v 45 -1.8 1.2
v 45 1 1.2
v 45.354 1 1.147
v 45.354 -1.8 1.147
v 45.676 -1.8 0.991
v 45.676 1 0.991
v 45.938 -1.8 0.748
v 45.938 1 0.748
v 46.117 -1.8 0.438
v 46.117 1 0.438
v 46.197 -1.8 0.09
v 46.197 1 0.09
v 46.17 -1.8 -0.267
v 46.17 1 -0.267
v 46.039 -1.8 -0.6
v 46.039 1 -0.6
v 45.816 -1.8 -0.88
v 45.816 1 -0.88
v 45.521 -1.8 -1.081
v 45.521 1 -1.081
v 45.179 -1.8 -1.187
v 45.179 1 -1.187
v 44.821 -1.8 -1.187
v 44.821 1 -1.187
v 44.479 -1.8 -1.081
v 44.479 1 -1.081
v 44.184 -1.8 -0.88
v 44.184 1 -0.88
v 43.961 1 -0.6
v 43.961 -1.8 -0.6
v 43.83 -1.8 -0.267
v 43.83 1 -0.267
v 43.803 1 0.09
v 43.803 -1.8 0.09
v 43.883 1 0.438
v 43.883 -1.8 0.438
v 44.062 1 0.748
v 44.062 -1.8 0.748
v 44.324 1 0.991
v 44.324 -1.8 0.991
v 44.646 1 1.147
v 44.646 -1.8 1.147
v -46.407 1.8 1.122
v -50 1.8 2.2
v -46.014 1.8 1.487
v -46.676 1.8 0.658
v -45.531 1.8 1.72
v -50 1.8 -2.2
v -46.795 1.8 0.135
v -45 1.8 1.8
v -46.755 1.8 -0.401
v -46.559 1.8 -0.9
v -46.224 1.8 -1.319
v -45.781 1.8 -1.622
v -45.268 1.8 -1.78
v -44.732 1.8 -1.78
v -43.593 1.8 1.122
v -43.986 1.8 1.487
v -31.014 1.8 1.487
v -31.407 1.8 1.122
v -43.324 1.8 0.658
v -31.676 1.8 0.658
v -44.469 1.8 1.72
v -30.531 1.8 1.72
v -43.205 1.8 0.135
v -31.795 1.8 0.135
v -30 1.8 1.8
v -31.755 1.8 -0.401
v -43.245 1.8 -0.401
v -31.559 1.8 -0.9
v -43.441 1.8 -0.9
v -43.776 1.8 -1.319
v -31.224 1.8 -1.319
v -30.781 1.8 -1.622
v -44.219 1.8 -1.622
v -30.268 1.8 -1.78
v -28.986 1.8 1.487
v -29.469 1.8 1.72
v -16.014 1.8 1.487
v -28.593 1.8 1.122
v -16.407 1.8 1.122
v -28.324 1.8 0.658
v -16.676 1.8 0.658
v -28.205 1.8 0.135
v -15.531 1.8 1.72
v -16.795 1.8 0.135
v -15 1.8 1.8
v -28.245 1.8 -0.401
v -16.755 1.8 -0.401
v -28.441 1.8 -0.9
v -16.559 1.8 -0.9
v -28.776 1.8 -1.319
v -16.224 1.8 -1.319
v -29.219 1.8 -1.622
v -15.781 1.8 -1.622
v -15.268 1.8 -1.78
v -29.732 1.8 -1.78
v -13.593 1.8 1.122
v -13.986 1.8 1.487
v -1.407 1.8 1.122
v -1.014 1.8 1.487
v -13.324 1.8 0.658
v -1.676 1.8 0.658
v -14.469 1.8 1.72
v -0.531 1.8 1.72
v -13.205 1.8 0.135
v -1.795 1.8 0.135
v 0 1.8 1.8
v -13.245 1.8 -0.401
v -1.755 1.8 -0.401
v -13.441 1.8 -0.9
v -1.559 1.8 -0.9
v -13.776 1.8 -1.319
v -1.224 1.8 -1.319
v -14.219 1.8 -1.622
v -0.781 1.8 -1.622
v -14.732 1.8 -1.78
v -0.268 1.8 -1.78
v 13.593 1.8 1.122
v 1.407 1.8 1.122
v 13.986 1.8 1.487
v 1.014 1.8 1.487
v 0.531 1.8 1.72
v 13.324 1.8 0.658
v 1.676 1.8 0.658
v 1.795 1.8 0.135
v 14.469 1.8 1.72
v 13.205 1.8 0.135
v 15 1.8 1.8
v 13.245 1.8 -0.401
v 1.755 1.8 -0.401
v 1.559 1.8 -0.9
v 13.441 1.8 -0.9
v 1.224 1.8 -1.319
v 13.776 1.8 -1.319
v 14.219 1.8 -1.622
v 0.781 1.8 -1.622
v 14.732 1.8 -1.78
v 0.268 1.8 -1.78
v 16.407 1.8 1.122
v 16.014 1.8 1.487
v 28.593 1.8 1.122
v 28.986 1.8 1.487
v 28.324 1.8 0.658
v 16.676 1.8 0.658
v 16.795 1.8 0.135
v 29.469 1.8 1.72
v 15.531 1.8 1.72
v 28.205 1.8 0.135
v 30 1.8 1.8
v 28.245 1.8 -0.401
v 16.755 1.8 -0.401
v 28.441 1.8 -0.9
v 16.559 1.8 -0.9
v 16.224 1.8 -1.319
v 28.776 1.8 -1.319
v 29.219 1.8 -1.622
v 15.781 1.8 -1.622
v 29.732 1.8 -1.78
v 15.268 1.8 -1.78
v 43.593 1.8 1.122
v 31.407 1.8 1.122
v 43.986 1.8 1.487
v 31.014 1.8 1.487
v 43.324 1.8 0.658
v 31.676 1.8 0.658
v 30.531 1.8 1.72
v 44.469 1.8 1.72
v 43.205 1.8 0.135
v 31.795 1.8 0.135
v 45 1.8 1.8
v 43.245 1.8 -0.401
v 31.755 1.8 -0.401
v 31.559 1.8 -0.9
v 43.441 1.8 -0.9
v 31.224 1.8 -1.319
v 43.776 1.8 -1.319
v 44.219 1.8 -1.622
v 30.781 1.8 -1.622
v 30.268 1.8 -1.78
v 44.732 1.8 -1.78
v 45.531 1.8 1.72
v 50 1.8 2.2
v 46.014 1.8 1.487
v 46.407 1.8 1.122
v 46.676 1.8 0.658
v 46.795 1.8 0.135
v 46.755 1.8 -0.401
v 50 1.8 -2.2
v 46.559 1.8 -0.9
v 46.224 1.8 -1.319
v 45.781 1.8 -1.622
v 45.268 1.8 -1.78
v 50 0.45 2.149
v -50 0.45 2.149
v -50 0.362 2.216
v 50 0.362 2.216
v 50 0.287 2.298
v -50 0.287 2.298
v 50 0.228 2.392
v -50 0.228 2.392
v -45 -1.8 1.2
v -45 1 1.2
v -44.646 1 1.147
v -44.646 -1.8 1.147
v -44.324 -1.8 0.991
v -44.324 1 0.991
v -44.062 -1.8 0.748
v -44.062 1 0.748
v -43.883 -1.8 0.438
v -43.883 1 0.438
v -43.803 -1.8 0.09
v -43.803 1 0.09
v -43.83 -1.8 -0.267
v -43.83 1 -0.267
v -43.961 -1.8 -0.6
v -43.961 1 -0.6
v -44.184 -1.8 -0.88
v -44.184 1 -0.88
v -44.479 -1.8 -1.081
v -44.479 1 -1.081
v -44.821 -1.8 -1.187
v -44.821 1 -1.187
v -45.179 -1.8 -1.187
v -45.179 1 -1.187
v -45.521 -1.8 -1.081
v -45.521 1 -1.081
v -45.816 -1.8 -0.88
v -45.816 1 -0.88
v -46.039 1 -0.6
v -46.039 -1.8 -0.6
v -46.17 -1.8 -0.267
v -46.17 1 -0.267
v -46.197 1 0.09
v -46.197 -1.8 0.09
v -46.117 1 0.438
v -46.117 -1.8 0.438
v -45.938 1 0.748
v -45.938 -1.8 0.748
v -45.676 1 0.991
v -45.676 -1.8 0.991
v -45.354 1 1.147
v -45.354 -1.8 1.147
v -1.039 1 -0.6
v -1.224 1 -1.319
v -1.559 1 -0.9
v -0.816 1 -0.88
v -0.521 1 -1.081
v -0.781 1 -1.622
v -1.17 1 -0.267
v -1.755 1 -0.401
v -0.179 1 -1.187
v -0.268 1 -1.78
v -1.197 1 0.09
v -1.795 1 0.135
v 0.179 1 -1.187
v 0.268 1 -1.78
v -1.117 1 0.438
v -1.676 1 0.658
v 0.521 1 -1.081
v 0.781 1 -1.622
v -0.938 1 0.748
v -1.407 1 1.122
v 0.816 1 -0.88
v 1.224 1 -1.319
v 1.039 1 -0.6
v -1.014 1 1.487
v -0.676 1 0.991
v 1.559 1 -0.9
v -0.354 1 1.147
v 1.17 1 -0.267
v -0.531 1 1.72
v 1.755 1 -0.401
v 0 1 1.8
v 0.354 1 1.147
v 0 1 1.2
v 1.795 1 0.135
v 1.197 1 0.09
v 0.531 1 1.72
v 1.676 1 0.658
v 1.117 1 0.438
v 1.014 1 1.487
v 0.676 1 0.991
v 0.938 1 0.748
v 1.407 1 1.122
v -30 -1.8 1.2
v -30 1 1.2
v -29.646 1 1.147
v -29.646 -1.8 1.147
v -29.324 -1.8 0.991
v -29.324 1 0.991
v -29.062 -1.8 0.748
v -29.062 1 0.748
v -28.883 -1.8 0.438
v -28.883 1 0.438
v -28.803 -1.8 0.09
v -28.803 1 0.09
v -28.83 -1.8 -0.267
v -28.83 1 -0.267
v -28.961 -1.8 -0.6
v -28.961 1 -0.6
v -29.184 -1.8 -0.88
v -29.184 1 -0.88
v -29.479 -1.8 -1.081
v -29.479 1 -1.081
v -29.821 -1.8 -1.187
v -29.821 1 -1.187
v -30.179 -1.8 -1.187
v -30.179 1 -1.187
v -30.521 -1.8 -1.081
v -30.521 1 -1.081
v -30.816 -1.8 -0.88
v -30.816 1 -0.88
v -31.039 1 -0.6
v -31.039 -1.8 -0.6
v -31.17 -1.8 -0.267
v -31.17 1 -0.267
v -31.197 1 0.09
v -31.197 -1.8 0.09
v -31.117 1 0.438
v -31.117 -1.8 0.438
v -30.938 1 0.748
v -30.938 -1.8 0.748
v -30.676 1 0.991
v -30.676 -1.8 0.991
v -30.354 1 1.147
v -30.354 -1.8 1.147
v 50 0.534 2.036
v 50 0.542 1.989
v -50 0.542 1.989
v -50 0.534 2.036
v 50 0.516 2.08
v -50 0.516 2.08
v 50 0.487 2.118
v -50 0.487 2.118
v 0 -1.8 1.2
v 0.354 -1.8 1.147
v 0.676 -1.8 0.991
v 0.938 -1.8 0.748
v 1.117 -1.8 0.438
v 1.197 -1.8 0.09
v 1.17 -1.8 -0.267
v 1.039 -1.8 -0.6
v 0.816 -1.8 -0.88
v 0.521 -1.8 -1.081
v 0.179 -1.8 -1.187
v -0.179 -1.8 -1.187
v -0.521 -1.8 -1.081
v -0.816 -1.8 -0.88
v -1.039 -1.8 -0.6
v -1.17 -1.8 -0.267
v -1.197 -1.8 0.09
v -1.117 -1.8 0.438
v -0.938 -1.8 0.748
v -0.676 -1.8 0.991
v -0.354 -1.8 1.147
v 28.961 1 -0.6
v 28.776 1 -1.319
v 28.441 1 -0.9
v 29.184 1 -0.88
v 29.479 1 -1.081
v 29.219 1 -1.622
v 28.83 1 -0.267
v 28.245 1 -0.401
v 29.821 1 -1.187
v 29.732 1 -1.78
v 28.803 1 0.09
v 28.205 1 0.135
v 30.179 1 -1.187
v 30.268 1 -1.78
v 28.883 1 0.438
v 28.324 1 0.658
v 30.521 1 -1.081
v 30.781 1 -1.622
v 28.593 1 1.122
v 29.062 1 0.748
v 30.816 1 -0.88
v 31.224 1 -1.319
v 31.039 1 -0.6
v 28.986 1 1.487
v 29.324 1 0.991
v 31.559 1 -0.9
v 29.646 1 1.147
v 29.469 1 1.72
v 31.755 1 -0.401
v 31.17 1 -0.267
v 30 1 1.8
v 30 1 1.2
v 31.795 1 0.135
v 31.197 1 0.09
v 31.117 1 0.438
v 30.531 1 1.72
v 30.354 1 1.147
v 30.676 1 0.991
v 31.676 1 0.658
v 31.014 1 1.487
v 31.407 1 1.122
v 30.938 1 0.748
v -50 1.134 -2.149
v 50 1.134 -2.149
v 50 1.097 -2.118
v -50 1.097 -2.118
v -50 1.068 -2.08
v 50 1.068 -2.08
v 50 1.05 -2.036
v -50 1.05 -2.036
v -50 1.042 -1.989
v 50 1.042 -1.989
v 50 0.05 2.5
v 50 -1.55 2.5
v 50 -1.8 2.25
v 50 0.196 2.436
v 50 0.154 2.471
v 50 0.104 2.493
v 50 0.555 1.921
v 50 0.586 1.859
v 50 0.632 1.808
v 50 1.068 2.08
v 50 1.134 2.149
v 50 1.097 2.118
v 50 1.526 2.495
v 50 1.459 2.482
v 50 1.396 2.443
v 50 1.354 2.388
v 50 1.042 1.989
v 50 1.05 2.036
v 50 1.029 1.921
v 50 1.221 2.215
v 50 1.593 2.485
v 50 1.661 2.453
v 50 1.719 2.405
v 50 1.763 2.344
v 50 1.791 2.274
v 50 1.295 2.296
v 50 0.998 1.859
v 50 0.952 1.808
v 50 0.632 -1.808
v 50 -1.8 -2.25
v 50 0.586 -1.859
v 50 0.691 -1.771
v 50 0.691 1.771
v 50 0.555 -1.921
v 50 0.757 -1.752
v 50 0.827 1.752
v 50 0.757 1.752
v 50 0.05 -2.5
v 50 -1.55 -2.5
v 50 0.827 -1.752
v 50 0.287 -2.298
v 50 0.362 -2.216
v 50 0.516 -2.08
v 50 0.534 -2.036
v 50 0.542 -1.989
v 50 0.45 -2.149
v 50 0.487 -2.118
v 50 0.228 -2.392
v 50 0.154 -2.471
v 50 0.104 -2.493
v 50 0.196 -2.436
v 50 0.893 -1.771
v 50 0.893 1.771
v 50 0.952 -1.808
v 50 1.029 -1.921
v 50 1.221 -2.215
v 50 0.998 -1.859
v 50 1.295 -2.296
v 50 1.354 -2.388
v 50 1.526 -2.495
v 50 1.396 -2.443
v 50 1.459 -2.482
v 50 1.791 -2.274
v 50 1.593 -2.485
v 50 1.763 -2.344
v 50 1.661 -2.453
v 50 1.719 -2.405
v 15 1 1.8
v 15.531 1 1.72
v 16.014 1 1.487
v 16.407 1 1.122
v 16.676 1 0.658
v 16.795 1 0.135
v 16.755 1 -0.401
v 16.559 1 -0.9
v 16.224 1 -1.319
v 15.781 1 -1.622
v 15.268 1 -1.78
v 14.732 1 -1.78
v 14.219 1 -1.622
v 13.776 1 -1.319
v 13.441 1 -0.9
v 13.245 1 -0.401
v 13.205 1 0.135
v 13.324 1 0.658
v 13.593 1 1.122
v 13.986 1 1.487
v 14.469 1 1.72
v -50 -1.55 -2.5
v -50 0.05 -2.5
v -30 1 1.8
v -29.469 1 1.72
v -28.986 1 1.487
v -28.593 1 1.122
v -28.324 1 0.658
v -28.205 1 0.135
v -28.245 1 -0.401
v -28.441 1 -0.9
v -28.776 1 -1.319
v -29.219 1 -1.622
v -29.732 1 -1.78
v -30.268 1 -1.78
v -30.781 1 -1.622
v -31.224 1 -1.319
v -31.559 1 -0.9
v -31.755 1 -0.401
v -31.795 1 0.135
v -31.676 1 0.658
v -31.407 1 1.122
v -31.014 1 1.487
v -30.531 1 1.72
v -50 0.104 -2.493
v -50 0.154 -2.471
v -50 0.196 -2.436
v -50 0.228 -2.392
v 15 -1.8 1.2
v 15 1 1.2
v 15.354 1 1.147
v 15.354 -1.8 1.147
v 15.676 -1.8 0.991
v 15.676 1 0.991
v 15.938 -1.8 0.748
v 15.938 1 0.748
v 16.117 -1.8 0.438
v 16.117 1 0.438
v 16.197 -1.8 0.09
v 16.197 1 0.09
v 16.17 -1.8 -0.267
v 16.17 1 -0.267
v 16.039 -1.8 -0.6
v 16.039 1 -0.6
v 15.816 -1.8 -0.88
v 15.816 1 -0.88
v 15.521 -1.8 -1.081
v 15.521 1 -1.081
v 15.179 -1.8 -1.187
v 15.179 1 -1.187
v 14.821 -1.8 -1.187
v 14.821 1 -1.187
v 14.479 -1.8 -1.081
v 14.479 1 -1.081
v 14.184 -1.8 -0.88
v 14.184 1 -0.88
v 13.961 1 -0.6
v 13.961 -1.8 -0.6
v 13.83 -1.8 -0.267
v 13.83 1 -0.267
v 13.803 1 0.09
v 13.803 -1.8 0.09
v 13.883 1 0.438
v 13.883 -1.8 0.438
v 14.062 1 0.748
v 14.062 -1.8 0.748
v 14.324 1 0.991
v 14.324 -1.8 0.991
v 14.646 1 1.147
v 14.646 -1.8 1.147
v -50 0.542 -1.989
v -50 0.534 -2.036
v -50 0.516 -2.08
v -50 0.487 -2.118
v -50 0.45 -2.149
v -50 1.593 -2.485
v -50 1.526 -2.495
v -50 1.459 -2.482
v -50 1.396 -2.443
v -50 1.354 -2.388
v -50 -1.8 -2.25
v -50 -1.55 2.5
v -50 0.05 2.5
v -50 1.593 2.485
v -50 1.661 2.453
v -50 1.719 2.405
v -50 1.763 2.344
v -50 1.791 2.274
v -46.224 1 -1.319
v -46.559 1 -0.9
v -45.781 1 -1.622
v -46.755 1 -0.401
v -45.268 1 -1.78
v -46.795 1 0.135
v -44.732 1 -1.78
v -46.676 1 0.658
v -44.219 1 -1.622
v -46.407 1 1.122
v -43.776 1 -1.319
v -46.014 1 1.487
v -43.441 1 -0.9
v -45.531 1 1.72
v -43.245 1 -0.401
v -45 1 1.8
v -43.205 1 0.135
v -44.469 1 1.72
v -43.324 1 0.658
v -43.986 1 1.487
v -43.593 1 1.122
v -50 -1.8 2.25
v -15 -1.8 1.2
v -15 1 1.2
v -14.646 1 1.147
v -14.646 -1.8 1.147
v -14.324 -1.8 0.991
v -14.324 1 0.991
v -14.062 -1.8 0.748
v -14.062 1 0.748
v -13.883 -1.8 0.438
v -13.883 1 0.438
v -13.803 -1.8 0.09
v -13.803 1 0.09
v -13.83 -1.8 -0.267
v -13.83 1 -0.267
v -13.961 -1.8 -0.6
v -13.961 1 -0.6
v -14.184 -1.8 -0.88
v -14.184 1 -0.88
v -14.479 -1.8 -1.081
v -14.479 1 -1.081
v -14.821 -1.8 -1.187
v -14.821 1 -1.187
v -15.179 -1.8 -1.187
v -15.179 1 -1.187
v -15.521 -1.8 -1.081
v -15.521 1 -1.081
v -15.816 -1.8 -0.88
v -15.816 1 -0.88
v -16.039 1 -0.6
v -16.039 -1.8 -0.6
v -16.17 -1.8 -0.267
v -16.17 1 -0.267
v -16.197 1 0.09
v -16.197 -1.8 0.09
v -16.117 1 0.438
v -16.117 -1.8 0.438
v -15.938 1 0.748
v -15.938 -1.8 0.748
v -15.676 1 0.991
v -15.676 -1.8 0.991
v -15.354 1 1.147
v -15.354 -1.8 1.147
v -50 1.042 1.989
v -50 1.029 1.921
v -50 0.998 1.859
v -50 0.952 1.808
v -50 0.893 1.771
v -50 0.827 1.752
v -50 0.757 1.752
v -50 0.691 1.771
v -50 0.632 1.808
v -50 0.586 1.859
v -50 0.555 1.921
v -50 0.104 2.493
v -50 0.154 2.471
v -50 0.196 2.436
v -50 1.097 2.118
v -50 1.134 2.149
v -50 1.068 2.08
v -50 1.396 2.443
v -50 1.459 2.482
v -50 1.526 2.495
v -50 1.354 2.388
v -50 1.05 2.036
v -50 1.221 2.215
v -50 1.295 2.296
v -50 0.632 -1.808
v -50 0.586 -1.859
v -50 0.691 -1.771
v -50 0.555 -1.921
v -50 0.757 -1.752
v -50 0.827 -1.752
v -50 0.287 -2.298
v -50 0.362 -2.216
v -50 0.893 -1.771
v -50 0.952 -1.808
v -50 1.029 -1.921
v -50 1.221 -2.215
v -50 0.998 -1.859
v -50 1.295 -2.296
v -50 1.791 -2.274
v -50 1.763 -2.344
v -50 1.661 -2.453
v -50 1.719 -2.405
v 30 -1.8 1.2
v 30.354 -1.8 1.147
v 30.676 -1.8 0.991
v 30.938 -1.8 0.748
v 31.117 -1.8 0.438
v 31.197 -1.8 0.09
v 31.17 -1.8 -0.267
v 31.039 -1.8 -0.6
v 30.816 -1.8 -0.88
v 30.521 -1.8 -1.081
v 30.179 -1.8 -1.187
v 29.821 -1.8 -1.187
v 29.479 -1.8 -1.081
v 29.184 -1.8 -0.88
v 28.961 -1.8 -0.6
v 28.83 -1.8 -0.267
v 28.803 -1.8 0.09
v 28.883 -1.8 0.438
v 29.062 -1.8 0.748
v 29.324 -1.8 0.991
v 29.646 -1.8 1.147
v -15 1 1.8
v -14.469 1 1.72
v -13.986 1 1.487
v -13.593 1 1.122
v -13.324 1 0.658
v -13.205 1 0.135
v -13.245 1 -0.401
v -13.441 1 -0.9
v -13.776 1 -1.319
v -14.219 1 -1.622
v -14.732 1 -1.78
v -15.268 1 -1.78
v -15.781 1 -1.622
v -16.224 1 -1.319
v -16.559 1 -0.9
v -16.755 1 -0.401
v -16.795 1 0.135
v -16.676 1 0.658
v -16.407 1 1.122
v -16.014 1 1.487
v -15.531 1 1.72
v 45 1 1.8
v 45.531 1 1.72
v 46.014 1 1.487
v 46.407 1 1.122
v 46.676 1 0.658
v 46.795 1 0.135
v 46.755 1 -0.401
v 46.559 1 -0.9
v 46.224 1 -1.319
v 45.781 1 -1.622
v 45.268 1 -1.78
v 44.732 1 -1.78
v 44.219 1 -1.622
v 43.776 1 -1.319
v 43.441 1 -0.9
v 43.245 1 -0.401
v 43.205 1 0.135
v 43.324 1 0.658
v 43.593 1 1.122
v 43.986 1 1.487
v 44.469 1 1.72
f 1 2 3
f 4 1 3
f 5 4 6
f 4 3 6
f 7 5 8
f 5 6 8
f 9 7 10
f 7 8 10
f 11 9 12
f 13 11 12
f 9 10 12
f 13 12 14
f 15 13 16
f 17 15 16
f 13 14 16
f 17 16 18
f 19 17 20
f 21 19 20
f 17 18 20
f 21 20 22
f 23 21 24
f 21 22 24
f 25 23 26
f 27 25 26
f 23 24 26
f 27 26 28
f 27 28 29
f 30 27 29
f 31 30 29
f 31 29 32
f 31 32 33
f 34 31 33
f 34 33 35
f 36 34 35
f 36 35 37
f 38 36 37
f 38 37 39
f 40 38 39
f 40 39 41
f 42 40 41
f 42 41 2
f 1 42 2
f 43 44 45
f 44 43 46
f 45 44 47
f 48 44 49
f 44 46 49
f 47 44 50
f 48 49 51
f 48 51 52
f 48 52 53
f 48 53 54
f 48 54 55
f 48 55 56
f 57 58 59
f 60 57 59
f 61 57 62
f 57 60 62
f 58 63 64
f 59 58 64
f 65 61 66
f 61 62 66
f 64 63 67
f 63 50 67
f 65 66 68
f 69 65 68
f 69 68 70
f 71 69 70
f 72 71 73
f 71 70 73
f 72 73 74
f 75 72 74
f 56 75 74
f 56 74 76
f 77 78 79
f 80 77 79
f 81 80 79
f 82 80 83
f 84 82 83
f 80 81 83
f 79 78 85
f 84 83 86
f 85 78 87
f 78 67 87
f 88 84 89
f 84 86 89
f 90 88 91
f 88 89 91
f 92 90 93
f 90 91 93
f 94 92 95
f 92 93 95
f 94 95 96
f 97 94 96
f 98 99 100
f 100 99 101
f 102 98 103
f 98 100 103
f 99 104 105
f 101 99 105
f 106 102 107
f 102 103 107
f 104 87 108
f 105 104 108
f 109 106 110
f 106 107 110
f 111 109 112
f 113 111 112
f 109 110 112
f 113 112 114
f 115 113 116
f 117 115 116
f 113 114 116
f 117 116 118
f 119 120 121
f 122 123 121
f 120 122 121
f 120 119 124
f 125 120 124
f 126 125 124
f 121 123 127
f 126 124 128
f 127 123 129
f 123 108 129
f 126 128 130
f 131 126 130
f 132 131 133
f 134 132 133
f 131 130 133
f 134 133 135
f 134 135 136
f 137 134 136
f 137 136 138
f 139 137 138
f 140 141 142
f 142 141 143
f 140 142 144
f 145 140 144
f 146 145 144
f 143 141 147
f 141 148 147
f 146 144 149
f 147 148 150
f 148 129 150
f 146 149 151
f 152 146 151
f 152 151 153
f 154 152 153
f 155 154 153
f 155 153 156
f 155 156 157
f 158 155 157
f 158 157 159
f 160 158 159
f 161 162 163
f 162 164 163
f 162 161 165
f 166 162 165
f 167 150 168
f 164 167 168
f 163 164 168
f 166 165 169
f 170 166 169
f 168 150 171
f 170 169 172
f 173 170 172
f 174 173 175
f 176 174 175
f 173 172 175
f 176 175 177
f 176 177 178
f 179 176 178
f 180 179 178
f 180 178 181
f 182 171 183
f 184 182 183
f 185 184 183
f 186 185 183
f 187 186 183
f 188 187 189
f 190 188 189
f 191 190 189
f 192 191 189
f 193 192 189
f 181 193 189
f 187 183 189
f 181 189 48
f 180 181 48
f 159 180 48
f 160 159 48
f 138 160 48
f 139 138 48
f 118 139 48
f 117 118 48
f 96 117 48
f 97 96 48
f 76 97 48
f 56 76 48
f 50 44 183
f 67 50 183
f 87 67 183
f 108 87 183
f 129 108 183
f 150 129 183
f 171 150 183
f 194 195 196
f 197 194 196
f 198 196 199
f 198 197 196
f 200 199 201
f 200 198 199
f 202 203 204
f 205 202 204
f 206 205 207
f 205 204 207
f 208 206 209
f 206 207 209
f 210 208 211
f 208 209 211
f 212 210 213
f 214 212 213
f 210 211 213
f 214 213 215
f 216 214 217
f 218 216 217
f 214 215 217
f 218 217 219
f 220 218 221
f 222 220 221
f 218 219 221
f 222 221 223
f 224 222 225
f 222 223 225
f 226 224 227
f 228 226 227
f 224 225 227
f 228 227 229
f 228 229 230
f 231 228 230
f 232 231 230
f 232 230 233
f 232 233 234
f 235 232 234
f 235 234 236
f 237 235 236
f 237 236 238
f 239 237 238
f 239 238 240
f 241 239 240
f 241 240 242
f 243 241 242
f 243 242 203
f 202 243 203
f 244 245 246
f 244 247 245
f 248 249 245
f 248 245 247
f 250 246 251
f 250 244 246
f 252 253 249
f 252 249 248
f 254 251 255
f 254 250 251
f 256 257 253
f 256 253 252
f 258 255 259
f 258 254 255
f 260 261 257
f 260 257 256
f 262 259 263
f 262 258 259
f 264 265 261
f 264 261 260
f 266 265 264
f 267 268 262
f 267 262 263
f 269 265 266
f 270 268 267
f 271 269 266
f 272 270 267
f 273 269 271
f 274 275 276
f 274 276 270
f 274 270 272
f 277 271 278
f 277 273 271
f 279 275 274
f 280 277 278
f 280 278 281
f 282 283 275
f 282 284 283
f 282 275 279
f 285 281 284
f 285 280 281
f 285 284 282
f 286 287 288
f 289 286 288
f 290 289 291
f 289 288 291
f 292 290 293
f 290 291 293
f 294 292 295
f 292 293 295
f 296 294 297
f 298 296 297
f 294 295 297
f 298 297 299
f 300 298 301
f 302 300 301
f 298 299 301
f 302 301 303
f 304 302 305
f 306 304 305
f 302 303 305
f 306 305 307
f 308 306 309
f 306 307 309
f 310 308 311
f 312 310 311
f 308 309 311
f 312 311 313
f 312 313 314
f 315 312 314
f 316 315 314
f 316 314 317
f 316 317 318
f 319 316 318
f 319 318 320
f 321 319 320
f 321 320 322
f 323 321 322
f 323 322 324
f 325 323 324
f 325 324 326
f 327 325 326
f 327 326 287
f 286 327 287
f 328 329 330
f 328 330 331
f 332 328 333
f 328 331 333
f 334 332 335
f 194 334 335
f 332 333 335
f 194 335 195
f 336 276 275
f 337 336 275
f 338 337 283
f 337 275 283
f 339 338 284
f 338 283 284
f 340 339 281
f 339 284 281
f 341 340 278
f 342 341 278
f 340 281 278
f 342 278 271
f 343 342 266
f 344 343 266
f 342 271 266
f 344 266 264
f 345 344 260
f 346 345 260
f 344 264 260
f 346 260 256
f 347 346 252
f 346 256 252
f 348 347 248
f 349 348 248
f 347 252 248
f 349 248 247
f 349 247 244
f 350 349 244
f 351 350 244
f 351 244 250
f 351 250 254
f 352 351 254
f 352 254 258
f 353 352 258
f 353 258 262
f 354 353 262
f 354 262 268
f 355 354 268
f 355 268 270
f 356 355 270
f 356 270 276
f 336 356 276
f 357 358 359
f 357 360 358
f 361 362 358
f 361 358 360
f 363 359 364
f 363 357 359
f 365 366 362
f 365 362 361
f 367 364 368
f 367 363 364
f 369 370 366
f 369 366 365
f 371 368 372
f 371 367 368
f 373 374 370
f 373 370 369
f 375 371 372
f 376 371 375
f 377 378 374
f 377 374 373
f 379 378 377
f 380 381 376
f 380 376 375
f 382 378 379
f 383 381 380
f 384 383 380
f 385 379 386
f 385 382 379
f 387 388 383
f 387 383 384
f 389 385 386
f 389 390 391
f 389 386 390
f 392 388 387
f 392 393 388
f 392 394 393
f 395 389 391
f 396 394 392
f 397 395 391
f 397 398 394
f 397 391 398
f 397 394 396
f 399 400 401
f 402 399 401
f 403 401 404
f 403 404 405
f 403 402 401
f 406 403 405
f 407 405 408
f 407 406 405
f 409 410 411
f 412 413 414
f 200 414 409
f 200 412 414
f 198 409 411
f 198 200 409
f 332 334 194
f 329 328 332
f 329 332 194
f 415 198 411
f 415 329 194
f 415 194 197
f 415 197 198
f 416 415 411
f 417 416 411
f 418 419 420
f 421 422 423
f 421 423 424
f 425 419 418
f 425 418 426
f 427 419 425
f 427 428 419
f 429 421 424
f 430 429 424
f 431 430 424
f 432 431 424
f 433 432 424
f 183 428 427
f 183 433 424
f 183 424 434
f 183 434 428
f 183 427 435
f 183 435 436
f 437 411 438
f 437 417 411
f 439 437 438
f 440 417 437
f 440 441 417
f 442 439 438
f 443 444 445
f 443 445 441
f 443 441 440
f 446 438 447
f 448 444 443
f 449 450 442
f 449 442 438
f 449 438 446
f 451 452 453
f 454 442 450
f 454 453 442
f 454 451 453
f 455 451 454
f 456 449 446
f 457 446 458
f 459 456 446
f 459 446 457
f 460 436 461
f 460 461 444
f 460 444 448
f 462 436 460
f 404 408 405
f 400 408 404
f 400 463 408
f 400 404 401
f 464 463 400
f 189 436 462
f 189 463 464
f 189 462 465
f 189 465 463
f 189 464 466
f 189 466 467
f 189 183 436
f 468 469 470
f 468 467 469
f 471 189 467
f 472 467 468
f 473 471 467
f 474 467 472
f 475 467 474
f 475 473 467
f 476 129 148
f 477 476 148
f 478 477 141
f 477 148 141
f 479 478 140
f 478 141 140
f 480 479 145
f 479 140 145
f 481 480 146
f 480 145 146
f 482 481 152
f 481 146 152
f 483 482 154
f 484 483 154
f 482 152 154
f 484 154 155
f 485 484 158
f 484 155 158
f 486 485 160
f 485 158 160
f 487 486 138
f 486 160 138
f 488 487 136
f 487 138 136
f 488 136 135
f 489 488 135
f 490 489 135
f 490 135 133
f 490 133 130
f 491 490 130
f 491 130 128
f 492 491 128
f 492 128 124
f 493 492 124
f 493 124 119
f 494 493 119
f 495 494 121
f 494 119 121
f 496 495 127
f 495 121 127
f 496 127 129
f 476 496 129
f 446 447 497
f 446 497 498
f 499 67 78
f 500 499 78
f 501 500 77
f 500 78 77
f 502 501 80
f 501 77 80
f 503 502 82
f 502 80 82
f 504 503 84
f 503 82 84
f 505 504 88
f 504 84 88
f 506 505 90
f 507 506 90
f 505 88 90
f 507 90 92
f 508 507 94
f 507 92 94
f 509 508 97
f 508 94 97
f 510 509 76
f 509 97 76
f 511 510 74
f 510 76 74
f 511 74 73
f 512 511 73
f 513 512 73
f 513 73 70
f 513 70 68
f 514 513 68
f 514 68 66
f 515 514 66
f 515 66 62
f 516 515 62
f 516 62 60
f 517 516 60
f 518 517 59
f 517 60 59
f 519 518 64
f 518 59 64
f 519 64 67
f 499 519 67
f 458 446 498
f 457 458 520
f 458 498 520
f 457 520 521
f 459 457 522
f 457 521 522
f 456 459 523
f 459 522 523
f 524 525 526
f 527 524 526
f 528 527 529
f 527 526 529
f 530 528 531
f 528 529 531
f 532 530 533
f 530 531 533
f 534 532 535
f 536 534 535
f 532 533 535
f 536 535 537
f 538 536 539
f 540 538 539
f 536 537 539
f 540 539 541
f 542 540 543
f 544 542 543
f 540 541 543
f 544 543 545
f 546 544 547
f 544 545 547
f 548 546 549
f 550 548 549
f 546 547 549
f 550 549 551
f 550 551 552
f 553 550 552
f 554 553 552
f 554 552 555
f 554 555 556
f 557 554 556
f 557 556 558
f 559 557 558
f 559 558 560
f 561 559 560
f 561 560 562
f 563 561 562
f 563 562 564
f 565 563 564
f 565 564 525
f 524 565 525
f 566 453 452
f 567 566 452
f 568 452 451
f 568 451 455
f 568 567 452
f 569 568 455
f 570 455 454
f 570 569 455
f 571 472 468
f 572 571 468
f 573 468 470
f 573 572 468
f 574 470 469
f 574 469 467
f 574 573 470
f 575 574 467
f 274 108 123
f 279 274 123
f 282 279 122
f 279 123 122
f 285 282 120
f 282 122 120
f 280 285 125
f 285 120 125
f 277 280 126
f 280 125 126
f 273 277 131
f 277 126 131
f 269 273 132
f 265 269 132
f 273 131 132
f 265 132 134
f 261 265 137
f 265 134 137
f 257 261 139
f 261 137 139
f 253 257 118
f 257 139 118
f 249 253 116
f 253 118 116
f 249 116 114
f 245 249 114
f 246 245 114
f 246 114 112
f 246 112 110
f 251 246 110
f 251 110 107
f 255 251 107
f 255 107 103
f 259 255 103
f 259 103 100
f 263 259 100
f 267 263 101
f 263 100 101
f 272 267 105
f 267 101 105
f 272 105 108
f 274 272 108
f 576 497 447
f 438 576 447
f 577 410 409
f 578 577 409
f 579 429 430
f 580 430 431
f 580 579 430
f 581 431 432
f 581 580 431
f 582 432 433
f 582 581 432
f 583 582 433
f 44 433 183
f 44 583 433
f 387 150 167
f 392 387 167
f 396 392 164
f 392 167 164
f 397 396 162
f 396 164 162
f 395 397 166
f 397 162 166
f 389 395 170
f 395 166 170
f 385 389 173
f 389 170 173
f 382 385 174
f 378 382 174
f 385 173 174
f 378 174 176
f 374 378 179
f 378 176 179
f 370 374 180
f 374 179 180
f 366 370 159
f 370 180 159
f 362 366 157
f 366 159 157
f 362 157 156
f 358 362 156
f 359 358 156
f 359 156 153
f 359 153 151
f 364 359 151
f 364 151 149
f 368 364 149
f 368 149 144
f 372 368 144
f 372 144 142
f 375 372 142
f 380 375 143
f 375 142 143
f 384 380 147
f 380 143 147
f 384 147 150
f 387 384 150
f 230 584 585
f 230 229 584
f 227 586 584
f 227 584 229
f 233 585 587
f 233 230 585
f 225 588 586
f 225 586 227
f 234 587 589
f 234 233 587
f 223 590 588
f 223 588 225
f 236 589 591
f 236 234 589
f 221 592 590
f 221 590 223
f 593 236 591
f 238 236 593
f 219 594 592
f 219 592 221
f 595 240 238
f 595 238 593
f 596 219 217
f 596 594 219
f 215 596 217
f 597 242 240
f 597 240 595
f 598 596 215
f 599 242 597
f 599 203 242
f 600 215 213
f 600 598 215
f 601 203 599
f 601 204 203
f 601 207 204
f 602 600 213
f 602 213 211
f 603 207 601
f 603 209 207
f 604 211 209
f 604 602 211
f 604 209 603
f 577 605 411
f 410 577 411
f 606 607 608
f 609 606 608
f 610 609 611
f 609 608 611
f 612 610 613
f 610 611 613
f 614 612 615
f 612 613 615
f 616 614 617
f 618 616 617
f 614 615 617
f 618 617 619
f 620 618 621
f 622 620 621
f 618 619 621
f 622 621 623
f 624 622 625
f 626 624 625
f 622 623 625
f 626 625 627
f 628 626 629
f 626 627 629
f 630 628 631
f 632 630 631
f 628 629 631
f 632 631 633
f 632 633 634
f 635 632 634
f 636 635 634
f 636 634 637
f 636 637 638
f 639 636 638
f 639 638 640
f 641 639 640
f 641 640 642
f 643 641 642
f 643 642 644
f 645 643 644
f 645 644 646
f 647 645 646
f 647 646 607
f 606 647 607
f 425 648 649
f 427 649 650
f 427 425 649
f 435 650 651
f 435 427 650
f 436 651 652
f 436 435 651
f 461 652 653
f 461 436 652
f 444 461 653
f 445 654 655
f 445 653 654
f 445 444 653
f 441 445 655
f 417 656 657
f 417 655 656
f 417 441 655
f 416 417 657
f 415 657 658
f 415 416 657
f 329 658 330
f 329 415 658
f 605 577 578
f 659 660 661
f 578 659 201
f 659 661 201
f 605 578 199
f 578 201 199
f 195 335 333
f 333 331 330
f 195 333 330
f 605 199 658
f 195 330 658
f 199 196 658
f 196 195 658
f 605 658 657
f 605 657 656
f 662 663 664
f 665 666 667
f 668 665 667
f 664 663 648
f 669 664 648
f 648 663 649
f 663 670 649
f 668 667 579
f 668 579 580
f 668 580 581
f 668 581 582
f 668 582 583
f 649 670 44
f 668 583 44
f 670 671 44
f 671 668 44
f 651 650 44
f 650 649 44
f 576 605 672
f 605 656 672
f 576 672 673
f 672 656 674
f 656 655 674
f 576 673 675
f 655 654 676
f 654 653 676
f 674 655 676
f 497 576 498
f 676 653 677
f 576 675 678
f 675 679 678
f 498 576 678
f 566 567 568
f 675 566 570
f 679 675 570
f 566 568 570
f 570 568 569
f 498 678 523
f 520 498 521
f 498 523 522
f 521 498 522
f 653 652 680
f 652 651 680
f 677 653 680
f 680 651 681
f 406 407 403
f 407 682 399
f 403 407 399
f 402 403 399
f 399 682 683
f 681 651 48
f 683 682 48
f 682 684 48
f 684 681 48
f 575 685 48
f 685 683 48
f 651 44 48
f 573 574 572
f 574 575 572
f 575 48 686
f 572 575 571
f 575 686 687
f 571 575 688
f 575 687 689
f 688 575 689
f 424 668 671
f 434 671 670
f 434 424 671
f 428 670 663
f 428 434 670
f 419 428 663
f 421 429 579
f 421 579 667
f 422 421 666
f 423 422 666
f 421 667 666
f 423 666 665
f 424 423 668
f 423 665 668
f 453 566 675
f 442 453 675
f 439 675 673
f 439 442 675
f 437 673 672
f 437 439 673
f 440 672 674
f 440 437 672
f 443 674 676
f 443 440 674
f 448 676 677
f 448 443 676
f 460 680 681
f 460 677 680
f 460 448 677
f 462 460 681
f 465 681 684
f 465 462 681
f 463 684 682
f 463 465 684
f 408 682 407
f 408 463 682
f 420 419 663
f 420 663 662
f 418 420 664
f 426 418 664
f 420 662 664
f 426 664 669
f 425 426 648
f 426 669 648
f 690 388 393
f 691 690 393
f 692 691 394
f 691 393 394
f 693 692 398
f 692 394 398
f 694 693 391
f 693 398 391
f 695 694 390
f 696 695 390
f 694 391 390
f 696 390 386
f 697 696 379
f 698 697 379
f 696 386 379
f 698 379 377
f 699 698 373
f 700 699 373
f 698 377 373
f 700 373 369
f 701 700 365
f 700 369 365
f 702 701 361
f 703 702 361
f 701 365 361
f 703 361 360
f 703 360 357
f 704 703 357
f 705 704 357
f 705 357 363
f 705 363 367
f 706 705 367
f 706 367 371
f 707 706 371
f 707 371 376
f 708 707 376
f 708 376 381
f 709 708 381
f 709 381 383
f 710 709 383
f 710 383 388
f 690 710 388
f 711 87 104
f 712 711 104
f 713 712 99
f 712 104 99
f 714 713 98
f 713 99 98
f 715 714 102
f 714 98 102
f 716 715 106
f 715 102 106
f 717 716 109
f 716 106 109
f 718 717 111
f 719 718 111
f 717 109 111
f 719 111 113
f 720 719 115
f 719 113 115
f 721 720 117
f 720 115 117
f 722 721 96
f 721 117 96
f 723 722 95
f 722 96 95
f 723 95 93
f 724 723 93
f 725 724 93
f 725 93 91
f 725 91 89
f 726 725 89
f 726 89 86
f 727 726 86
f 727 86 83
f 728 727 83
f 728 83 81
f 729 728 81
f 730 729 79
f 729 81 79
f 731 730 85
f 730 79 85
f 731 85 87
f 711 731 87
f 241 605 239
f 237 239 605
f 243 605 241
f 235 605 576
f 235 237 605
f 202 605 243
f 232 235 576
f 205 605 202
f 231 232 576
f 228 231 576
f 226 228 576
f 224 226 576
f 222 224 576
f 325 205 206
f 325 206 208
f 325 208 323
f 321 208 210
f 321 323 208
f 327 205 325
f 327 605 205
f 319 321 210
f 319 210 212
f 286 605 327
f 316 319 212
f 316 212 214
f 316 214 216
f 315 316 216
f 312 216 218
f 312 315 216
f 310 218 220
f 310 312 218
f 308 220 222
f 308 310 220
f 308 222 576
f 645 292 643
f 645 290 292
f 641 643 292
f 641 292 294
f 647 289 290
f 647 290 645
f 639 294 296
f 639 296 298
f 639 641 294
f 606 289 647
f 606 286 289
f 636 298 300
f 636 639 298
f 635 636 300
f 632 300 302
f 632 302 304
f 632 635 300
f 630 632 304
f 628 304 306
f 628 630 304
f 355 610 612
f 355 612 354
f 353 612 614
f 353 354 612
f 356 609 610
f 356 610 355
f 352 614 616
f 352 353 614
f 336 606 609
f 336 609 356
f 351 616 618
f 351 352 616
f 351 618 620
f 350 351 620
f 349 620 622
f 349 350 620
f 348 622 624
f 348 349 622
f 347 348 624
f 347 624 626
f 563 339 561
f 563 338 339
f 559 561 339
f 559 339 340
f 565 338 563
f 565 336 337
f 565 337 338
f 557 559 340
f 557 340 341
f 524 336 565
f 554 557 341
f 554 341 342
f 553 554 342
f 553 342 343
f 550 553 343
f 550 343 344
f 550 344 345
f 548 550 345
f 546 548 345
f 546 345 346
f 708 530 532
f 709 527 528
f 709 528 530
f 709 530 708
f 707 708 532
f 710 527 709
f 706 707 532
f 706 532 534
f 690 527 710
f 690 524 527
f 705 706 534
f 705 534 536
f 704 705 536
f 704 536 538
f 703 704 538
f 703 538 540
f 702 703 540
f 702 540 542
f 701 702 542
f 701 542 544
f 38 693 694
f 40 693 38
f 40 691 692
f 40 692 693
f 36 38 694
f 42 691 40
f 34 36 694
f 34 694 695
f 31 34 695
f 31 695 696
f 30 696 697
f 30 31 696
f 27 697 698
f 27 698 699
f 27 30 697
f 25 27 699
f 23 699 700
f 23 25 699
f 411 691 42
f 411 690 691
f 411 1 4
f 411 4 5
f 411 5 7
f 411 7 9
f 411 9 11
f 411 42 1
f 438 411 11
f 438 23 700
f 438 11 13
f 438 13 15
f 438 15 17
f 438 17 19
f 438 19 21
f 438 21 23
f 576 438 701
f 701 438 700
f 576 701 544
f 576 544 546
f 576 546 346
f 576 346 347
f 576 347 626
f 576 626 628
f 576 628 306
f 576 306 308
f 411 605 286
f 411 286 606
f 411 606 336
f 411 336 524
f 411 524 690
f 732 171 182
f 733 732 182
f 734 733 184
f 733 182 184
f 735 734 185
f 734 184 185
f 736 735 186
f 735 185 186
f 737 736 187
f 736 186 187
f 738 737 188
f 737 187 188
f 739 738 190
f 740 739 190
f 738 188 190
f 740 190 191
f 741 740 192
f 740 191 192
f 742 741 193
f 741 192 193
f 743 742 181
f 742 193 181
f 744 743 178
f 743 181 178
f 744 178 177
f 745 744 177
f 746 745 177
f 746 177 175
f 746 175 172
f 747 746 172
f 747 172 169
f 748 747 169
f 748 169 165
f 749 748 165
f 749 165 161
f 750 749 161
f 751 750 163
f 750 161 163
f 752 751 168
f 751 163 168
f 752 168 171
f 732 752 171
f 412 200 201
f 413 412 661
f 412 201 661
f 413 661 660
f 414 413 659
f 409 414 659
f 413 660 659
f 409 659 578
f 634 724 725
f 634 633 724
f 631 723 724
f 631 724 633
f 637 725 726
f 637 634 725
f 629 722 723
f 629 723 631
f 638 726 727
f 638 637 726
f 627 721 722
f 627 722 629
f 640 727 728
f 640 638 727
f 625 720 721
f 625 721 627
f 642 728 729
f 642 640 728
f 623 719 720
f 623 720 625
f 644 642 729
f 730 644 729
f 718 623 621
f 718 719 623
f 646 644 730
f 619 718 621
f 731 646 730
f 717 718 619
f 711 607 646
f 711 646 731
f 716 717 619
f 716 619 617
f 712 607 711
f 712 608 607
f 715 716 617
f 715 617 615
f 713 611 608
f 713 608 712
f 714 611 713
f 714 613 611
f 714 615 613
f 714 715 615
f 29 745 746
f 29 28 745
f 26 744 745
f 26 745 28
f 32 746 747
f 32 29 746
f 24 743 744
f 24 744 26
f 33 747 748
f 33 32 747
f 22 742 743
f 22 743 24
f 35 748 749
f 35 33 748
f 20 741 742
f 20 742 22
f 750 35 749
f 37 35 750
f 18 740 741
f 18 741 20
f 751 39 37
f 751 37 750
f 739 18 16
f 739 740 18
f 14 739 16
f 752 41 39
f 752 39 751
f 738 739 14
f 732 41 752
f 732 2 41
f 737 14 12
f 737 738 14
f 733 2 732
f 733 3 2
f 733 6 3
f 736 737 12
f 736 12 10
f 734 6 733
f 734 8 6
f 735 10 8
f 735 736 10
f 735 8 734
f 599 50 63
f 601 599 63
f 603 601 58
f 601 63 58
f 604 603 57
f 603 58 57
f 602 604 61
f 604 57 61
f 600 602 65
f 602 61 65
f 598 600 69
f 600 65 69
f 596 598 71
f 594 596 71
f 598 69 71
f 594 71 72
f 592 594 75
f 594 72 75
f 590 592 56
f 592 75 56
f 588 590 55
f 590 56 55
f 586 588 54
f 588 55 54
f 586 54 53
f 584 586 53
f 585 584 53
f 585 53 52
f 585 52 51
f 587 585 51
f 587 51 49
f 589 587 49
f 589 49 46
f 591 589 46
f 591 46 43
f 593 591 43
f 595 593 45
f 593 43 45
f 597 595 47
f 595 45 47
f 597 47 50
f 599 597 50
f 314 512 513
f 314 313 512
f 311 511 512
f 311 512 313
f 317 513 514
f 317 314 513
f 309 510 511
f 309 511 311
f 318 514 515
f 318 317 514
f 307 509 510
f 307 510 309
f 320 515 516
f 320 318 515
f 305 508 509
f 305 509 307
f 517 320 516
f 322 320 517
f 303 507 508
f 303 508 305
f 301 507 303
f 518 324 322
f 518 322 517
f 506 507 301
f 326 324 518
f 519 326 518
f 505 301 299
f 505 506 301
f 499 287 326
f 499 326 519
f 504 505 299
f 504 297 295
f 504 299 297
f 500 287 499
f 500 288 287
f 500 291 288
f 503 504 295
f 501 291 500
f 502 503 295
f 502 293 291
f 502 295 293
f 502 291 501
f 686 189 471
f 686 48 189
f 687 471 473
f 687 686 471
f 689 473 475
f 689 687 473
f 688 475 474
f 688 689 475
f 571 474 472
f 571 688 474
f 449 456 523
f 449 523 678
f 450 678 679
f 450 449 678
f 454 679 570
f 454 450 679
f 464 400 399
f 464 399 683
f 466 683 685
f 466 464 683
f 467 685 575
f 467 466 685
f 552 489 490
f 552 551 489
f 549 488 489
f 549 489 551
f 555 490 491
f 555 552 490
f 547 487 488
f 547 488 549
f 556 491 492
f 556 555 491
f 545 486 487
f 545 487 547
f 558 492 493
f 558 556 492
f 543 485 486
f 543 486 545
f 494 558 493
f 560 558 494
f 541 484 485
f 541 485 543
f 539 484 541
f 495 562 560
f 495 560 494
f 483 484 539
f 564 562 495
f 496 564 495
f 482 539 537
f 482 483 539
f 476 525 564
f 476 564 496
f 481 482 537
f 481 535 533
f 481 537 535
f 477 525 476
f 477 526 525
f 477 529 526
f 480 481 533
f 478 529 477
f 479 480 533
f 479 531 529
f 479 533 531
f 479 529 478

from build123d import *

# Parameters (mm, degrees)
SKETCH_1_W             = 5
SKETCH_1_H             = 3.6
EXTRUDE_1_DEPTH        = 50
CUT_EXTRUDE_1_DEPTH    = 101.047438748
SKETCH_3_R             = 1.79995
CUT_EXTRUDE_2_DEPTH    = 0.8
SKETCH_4_R             = 1.2
CUT_EXTRUDE_3_DEPTH    = 51.140702029
FILLET_1_R             = 0.3
FILLET_2_R             = 0.2
CHAMFER_1_SIZE         = 0.25
PATTERN_LINEAR_1_COUNT = 7
PATTERN_LINEAR_1_PITCH = 15


with BuildPart() as part:
    # 草图1 → 凸台-拉伸1 (new, symmetric)
    with BuildSketch(Plane(origin=(0, 0, 0), x_dir=(0, 0, -1), z_dir=(1, 0, 0))):
        Rectangle(SKETCH_1_W, SKETCH_1_H)
    extrude(amount=EXTRUDE_1_DEPTH, both=True)

    # 草图2 → 切除-拉伸1 (cut, through all)
    with BuildSketch(Plane(origin=(50, 0, 0), x_dir=(0, 0, -1), z_dir=(1, 0, 0))):
        with BuildLine():
            Line((2.5, 1.4), (2.5, 0.184))
            ThreePointArc((2.5, 0.184), (2.260324923, 0.318670305), (2.1, 0.542))
            Line((2.1, 0.542), (2, 0.542))
            ThreePointArc((2, 0.542), (1.75, 0.792), (2, 1.042))
            Line((2, 1.042), (2.1, 1.042))
            ThreePointArc((2.1, 1.042), (2.260324923, 1.265329695), (2.5, 1.4))
        make_face()
        with BuildLine():
            Line((-2.1, 1.042), (-2, 1.042))
            ThreePointArc((-2, 1.042), (-1.75, 0.792), (-2, 0.542))
            Line((-2, 0.542), (-2.1, 0.542))
            ThreePointArc((-2.1, 0.542), (-2.260324923, 0.318670305), (-2.5, 0.184))
            Line((-2.5, 0.184), (-2.5, 1.4))
            ThreePointArc((-2.5, 1.4), (-2.260324923, 1.265329695), (-2.1, 1.042))
        make_face()
    extrude(amount=-CUT_EXTRUDE_1_DEPTH, mode=Mode.SUBTRACT)

    # 草图3 → 切除-拉伸2 (cut)
    with BuildSketch(Plane(origin=(0, 1.8, 0), x_dir=(1, 0, 0), z_dir=(0, 1, 0))):
        with Locations(Location((-45, 0, 0), (0, 0, 270))):
            Circle(SKETCH_3_R)
    cut_extrude_2 = extrude(amount=-CUT_EXTRUDE_2_DEPTH, mode=Mode.SUBTRACT)

    # 草图4 → 切除-拉伸3 (cut, through all)
    with BuildSketch(Plane(origin=(0, 1, 0), x_dir=(1, 0, 0), z_dir=(0, 1, 0))):
        with Locations(Location((-45, 0, 0), (0, 0, 270))):
            Circle(SKETCH_4_R)
    cut_extrude_3 = extrude(amount=-CUT_EXTRUDE_3_DEPTH, mode=Mode.SUBTRACT)

    # 圆角1
    fillet_1_edges = [part.edges().sort_by_distance(p)[0] for p in [
        (0, 1.8, 2.5),
        (0, 1.8, -2.5),
    ]]
    fillet(fillet_1_edges, radius=FILLET_1_R)

    # 圆角2
    fillet_2_edges = [part.edges().sort_by_distance(p)[0] for p in [
        (0, 1.4, -2.5),
        (0, 1.042, -2.1),
        (0, 0.542, -2.1),
        (0, 0.184, -2.5),
        (0, 0.184, 2.5),
        (0, 1.4, 2.5),
        (0, 1.042, 2.1),
        (0, 0.542, 2.1),
    ]]
    fillet(fillet_2_edges, radius=FILLET_2_R)

    # 倒角1
    chamfer_1_edges = [part.edges().sort_by_distance(p)[0] for p in [
        (0, -1.8, -2.5),
        (0, -1.8, 2.5),
    ]]
    chamfer(chamfer_1_edges, length=CHAMFER_1_SIZE)

    # 阵列(线性)1: 切除-拉伸2, 切除-拉伸3 ×7
    with Locations(*[(i * PATTERN_LINEAR_1_PITCH, 0, 0) for i in range(1, PATTERN_LINEAR_1_COUNT)]):
        add(cut_extrude_2, mode=Mode.SUBTRACT)
        add(cut_extrude_3, mode=Mode.SUBTRACT)


solid = part.part
